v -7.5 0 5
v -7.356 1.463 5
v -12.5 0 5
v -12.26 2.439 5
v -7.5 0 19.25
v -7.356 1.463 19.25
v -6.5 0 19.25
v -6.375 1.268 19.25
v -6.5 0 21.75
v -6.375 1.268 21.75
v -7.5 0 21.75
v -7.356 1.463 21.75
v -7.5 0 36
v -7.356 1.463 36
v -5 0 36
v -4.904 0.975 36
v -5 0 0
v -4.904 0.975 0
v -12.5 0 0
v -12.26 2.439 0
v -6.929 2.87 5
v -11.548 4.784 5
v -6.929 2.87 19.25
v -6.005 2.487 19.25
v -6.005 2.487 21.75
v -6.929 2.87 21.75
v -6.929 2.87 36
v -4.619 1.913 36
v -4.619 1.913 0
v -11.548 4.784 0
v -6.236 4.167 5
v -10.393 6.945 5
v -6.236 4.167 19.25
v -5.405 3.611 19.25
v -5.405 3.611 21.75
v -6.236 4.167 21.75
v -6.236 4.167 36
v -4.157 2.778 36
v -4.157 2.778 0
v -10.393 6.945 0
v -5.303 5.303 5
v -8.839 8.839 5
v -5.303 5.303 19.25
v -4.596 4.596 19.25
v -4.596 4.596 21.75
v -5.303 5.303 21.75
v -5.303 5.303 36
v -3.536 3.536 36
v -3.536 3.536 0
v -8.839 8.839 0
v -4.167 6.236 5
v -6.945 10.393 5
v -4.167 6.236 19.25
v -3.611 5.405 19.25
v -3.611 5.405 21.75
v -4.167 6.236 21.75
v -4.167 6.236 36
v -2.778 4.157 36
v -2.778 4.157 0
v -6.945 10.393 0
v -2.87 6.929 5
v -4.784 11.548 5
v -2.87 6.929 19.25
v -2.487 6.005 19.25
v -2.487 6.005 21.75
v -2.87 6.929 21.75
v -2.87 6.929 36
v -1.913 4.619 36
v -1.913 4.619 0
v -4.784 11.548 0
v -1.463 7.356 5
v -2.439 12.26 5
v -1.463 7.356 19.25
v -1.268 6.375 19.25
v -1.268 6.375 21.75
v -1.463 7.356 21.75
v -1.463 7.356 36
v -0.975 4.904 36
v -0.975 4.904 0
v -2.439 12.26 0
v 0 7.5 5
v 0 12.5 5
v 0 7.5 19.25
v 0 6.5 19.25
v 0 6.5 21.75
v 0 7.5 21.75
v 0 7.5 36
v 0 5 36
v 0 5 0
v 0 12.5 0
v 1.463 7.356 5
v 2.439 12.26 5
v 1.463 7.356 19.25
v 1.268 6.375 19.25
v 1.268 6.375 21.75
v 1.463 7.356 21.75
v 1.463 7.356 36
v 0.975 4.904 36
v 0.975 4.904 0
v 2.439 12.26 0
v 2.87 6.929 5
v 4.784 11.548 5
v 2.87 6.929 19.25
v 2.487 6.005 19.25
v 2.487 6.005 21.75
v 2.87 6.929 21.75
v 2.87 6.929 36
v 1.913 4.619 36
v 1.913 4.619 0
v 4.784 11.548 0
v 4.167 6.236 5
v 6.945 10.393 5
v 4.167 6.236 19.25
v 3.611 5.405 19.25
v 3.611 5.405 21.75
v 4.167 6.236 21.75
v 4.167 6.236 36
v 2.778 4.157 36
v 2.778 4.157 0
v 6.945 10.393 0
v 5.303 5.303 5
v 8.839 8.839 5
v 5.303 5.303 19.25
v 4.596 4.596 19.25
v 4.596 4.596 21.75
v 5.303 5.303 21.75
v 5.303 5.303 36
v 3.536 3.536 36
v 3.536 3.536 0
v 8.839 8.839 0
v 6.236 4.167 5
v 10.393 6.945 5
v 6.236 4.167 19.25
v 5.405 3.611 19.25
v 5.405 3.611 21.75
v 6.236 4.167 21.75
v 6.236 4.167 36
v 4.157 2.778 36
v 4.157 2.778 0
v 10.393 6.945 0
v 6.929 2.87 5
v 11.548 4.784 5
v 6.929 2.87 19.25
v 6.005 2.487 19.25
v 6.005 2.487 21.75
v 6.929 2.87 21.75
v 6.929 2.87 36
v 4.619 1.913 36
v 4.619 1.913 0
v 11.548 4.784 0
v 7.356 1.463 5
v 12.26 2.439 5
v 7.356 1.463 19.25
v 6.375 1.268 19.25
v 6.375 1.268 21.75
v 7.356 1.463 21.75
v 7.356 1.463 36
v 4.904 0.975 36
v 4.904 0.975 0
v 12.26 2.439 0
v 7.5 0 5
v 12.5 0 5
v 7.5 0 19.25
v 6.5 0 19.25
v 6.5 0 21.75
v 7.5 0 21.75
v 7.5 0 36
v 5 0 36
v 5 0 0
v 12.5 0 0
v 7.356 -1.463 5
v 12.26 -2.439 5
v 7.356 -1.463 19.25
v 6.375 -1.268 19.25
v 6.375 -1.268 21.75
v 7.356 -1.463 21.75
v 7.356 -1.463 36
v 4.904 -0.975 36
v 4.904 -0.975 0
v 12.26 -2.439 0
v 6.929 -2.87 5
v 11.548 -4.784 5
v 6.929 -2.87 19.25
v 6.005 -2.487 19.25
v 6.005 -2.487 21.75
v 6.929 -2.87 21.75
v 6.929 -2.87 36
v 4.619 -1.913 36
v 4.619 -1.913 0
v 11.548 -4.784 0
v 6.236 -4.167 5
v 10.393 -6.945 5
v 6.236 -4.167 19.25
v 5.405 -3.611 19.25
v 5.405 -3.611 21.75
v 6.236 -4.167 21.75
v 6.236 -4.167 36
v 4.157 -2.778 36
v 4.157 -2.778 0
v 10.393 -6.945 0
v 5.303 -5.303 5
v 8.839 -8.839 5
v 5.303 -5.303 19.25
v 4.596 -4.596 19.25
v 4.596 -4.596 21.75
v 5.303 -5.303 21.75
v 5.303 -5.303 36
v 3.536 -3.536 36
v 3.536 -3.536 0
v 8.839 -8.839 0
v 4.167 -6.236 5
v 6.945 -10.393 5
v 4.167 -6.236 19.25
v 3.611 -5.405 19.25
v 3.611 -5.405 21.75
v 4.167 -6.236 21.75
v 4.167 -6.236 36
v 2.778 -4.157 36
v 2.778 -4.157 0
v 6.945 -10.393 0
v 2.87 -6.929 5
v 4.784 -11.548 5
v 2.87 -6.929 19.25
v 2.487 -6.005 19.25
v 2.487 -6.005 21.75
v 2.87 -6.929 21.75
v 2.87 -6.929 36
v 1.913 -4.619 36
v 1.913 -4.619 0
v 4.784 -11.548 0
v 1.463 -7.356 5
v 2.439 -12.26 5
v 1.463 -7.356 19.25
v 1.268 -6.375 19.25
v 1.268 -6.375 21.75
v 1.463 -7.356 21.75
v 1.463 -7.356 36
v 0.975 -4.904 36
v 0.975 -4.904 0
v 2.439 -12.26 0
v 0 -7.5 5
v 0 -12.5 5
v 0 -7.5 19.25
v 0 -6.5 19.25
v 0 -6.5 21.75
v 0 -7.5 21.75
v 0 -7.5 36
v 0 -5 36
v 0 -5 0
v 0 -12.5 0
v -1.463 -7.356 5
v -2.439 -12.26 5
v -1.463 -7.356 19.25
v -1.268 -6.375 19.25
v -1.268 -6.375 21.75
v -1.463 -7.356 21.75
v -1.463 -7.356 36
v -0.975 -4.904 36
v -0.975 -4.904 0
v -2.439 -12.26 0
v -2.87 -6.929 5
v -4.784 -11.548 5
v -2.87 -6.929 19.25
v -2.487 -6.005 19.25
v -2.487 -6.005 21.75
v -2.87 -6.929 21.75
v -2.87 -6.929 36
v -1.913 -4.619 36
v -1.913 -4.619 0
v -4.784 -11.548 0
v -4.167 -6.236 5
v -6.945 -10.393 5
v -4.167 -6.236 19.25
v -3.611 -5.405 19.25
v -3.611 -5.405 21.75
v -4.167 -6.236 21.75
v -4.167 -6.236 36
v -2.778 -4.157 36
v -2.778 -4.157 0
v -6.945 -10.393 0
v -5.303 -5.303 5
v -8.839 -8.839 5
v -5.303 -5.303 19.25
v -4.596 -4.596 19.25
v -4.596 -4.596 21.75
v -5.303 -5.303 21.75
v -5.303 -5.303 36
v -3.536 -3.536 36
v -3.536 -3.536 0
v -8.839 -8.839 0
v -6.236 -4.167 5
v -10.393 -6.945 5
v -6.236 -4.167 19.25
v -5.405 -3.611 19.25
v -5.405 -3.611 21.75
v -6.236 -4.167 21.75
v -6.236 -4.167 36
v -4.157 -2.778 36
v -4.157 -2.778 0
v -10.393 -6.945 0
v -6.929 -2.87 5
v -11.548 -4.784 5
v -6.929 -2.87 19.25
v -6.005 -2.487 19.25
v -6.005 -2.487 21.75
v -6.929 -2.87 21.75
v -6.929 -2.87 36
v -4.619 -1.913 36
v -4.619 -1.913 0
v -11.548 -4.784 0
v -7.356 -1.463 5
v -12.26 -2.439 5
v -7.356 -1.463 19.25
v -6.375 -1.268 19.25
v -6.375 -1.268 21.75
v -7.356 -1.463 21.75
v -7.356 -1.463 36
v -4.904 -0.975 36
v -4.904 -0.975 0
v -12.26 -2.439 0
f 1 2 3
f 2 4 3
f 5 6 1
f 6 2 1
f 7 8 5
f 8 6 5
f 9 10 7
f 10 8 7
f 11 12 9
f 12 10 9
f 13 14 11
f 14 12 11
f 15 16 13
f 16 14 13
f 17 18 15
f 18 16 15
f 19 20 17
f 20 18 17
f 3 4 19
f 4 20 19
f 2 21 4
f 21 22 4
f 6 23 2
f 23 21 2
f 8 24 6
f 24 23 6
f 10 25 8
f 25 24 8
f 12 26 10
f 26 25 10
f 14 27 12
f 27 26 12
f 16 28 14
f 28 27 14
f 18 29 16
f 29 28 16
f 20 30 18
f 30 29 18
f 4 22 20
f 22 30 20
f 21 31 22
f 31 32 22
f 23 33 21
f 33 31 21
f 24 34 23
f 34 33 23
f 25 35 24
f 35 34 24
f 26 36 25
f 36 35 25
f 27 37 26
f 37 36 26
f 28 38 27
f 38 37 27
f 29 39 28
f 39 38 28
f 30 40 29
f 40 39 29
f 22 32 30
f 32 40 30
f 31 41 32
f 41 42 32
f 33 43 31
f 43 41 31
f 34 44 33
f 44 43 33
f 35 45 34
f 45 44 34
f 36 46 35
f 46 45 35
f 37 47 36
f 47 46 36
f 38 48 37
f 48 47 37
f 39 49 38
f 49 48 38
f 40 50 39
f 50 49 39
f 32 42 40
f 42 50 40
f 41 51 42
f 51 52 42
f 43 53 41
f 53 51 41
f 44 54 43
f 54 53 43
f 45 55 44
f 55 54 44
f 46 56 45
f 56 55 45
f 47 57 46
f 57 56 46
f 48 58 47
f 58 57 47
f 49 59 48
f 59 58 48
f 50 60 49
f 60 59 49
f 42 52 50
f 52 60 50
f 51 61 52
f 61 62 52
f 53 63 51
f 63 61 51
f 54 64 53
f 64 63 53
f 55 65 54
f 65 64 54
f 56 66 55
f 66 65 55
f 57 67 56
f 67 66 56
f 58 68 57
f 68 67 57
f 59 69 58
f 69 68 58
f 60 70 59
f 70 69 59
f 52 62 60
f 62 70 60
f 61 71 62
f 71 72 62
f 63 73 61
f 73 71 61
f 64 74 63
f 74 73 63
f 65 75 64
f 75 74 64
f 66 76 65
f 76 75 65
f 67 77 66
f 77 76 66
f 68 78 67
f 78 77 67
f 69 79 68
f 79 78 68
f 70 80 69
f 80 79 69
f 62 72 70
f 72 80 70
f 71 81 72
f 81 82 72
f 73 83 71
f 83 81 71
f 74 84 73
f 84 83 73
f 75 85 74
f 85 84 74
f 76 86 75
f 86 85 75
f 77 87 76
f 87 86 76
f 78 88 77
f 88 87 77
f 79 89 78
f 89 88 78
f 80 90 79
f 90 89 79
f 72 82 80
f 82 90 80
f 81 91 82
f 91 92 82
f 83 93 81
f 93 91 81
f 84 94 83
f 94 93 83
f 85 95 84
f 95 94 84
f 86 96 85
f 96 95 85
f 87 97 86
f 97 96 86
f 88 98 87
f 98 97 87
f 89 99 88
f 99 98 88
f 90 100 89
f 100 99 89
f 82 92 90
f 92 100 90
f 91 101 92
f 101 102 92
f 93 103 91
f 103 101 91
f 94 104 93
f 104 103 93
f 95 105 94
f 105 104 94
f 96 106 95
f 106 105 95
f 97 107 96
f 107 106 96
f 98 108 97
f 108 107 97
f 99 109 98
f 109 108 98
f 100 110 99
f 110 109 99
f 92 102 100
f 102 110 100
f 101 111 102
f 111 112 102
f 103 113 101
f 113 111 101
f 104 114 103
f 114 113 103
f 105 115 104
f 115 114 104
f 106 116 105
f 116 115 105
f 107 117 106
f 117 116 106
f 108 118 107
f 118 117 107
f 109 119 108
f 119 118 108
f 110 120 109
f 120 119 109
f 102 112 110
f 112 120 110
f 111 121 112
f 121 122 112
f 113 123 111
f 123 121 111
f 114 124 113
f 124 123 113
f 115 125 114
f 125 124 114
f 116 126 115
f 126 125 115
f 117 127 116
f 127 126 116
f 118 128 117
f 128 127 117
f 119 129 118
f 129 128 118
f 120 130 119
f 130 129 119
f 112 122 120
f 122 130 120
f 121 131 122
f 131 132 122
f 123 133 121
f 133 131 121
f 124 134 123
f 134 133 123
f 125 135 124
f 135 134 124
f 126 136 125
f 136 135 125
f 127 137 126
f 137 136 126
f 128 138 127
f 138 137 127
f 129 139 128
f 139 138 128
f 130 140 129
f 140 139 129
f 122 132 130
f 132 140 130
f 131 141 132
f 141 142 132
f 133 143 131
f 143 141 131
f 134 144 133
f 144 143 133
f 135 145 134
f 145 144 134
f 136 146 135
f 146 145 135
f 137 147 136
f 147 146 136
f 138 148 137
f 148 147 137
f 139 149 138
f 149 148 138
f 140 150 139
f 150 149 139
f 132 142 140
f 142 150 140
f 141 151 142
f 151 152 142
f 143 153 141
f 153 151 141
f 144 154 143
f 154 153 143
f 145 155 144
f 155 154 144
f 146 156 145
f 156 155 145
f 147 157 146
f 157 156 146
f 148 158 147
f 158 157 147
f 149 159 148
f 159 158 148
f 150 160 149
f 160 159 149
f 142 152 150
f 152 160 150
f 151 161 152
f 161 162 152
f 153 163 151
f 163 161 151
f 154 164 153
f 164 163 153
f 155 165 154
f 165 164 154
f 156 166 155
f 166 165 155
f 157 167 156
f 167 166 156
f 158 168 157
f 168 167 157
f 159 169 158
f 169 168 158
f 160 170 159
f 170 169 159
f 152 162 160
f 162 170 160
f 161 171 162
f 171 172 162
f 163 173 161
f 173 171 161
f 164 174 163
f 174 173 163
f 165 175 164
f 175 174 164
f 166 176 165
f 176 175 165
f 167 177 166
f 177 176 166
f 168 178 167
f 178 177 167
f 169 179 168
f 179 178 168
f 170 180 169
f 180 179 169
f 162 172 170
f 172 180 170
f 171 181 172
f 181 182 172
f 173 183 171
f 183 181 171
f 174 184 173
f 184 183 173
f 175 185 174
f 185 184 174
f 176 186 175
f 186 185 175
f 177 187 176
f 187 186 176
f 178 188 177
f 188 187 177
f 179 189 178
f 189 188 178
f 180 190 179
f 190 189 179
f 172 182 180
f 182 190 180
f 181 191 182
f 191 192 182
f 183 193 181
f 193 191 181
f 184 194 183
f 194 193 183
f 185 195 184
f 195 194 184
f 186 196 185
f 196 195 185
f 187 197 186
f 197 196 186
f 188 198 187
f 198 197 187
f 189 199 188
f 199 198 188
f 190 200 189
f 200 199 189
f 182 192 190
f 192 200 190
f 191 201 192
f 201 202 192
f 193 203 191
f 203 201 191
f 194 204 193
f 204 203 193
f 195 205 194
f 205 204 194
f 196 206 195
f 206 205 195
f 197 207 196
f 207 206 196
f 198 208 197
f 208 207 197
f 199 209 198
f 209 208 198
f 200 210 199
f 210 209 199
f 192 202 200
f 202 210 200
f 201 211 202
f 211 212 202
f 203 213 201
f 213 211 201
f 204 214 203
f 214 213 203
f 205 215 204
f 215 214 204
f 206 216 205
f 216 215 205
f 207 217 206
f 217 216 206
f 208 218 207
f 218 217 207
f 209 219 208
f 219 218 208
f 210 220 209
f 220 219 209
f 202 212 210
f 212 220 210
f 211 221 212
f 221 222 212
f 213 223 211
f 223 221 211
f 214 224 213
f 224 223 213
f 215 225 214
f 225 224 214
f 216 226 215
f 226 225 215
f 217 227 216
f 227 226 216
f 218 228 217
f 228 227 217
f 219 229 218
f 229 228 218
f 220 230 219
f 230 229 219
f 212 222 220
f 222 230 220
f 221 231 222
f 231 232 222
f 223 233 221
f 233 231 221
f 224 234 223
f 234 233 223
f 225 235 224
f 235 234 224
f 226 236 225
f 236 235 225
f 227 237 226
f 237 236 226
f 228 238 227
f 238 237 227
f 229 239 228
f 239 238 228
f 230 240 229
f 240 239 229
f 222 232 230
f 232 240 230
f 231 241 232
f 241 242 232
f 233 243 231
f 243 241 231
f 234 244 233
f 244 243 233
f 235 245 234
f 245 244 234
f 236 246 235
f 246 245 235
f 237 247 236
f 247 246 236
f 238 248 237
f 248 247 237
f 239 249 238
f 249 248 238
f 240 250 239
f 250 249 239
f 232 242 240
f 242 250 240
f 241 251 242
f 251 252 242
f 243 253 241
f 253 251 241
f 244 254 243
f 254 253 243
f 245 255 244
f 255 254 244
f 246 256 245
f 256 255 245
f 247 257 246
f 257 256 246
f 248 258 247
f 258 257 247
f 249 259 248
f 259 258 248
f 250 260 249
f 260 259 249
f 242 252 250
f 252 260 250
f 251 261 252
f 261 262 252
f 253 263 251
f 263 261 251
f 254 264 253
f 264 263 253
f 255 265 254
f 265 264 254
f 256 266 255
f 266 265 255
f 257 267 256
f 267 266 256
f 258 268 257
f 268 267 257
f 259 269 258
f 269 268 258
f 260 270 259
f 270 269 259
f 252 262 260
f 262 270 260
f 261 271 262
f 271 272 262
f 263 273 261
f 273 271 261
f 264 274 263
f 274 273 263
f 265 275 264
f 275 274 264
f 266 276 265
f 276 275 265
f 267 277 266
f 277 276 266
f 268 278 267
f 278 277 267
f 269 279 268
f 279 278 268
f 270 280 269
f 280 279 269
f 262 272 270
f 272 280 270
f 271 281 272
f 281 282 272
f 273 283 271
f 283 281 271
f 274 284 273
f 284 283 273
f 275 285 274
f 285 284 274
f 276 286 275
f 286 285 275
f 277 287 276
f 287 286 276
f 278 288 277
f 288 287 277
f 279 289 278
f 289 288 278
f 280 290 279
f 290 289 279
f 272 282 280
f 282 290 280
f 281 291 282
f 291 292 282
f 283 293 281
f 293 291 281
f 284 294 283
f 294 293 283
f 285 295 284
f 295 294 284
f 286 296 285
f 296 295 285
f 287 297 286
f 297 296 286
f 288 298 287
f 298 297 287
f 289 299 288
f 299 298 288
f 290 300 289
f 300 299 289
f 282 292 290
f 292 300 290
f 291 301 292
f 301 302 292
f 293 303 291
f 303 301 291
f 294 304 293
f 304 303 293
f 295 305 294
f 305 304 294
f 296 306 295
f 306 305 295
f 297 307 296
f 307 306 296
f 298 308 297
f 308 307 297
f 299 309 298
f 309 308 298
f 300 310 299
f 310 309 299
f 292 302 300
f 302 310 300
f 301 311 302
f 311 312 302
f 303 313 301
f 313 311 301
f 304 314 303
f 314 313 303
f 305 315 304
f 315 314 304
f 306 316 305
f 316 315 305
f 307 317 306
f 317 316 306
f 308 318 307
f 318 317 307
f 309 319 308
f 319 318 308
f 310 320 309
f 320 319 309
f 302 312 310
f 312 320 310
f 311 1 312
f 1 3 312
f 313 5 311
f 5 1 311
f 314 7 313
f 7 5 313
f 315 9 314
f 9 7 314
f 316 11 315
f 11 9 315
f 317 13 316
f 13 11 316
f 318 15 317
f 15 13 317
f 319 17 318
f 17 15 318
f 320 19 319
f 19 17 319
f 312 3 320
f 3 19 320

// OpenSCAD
$fn = 32;

// ----------------------------------------------------------------------
// Grooved revolve: flanged, bore R5
// ----------------------------------------------------------------------

// --- parameters (mm) ---
bore_r = 5;               // bore radius
outer_r = 7.5;            // outer radius of the body
total_h = 36;             // overall height, Z
wall = 2.5;               // radial wall thickness
groove_w = 2.5;           // groove width
groove_d = 1;             // groove depth
grooves = 1;              // number of outer grooves
flange_r = 12.5;          // flange radius
flange_h = 5;             // flange height

bbox_x = 2 * flange_r;  // full diameter
bore_d = 2 * bore_r;  // bore diameter
body_d = 2 * outer_r;  // body diameter
flange_d = 2 * flange_r;  // flange diameter
revolve_angle = 360;  // full turn around the Z axis

profile = [[5, 0], [7.5, 0], [12.5, 0], [12.5, 5], [7.5, 5], [7.5, 19.25], [6.5, 19.25], [6.5, 21.75], [7.5, 21.75], [7.5, 36], [5, 36]];  // primary outline, 11 points, counter clockwise

// --- the one profile operation ---
rotate_extrude(angle = revolve_angle) polygon(points = profile);
